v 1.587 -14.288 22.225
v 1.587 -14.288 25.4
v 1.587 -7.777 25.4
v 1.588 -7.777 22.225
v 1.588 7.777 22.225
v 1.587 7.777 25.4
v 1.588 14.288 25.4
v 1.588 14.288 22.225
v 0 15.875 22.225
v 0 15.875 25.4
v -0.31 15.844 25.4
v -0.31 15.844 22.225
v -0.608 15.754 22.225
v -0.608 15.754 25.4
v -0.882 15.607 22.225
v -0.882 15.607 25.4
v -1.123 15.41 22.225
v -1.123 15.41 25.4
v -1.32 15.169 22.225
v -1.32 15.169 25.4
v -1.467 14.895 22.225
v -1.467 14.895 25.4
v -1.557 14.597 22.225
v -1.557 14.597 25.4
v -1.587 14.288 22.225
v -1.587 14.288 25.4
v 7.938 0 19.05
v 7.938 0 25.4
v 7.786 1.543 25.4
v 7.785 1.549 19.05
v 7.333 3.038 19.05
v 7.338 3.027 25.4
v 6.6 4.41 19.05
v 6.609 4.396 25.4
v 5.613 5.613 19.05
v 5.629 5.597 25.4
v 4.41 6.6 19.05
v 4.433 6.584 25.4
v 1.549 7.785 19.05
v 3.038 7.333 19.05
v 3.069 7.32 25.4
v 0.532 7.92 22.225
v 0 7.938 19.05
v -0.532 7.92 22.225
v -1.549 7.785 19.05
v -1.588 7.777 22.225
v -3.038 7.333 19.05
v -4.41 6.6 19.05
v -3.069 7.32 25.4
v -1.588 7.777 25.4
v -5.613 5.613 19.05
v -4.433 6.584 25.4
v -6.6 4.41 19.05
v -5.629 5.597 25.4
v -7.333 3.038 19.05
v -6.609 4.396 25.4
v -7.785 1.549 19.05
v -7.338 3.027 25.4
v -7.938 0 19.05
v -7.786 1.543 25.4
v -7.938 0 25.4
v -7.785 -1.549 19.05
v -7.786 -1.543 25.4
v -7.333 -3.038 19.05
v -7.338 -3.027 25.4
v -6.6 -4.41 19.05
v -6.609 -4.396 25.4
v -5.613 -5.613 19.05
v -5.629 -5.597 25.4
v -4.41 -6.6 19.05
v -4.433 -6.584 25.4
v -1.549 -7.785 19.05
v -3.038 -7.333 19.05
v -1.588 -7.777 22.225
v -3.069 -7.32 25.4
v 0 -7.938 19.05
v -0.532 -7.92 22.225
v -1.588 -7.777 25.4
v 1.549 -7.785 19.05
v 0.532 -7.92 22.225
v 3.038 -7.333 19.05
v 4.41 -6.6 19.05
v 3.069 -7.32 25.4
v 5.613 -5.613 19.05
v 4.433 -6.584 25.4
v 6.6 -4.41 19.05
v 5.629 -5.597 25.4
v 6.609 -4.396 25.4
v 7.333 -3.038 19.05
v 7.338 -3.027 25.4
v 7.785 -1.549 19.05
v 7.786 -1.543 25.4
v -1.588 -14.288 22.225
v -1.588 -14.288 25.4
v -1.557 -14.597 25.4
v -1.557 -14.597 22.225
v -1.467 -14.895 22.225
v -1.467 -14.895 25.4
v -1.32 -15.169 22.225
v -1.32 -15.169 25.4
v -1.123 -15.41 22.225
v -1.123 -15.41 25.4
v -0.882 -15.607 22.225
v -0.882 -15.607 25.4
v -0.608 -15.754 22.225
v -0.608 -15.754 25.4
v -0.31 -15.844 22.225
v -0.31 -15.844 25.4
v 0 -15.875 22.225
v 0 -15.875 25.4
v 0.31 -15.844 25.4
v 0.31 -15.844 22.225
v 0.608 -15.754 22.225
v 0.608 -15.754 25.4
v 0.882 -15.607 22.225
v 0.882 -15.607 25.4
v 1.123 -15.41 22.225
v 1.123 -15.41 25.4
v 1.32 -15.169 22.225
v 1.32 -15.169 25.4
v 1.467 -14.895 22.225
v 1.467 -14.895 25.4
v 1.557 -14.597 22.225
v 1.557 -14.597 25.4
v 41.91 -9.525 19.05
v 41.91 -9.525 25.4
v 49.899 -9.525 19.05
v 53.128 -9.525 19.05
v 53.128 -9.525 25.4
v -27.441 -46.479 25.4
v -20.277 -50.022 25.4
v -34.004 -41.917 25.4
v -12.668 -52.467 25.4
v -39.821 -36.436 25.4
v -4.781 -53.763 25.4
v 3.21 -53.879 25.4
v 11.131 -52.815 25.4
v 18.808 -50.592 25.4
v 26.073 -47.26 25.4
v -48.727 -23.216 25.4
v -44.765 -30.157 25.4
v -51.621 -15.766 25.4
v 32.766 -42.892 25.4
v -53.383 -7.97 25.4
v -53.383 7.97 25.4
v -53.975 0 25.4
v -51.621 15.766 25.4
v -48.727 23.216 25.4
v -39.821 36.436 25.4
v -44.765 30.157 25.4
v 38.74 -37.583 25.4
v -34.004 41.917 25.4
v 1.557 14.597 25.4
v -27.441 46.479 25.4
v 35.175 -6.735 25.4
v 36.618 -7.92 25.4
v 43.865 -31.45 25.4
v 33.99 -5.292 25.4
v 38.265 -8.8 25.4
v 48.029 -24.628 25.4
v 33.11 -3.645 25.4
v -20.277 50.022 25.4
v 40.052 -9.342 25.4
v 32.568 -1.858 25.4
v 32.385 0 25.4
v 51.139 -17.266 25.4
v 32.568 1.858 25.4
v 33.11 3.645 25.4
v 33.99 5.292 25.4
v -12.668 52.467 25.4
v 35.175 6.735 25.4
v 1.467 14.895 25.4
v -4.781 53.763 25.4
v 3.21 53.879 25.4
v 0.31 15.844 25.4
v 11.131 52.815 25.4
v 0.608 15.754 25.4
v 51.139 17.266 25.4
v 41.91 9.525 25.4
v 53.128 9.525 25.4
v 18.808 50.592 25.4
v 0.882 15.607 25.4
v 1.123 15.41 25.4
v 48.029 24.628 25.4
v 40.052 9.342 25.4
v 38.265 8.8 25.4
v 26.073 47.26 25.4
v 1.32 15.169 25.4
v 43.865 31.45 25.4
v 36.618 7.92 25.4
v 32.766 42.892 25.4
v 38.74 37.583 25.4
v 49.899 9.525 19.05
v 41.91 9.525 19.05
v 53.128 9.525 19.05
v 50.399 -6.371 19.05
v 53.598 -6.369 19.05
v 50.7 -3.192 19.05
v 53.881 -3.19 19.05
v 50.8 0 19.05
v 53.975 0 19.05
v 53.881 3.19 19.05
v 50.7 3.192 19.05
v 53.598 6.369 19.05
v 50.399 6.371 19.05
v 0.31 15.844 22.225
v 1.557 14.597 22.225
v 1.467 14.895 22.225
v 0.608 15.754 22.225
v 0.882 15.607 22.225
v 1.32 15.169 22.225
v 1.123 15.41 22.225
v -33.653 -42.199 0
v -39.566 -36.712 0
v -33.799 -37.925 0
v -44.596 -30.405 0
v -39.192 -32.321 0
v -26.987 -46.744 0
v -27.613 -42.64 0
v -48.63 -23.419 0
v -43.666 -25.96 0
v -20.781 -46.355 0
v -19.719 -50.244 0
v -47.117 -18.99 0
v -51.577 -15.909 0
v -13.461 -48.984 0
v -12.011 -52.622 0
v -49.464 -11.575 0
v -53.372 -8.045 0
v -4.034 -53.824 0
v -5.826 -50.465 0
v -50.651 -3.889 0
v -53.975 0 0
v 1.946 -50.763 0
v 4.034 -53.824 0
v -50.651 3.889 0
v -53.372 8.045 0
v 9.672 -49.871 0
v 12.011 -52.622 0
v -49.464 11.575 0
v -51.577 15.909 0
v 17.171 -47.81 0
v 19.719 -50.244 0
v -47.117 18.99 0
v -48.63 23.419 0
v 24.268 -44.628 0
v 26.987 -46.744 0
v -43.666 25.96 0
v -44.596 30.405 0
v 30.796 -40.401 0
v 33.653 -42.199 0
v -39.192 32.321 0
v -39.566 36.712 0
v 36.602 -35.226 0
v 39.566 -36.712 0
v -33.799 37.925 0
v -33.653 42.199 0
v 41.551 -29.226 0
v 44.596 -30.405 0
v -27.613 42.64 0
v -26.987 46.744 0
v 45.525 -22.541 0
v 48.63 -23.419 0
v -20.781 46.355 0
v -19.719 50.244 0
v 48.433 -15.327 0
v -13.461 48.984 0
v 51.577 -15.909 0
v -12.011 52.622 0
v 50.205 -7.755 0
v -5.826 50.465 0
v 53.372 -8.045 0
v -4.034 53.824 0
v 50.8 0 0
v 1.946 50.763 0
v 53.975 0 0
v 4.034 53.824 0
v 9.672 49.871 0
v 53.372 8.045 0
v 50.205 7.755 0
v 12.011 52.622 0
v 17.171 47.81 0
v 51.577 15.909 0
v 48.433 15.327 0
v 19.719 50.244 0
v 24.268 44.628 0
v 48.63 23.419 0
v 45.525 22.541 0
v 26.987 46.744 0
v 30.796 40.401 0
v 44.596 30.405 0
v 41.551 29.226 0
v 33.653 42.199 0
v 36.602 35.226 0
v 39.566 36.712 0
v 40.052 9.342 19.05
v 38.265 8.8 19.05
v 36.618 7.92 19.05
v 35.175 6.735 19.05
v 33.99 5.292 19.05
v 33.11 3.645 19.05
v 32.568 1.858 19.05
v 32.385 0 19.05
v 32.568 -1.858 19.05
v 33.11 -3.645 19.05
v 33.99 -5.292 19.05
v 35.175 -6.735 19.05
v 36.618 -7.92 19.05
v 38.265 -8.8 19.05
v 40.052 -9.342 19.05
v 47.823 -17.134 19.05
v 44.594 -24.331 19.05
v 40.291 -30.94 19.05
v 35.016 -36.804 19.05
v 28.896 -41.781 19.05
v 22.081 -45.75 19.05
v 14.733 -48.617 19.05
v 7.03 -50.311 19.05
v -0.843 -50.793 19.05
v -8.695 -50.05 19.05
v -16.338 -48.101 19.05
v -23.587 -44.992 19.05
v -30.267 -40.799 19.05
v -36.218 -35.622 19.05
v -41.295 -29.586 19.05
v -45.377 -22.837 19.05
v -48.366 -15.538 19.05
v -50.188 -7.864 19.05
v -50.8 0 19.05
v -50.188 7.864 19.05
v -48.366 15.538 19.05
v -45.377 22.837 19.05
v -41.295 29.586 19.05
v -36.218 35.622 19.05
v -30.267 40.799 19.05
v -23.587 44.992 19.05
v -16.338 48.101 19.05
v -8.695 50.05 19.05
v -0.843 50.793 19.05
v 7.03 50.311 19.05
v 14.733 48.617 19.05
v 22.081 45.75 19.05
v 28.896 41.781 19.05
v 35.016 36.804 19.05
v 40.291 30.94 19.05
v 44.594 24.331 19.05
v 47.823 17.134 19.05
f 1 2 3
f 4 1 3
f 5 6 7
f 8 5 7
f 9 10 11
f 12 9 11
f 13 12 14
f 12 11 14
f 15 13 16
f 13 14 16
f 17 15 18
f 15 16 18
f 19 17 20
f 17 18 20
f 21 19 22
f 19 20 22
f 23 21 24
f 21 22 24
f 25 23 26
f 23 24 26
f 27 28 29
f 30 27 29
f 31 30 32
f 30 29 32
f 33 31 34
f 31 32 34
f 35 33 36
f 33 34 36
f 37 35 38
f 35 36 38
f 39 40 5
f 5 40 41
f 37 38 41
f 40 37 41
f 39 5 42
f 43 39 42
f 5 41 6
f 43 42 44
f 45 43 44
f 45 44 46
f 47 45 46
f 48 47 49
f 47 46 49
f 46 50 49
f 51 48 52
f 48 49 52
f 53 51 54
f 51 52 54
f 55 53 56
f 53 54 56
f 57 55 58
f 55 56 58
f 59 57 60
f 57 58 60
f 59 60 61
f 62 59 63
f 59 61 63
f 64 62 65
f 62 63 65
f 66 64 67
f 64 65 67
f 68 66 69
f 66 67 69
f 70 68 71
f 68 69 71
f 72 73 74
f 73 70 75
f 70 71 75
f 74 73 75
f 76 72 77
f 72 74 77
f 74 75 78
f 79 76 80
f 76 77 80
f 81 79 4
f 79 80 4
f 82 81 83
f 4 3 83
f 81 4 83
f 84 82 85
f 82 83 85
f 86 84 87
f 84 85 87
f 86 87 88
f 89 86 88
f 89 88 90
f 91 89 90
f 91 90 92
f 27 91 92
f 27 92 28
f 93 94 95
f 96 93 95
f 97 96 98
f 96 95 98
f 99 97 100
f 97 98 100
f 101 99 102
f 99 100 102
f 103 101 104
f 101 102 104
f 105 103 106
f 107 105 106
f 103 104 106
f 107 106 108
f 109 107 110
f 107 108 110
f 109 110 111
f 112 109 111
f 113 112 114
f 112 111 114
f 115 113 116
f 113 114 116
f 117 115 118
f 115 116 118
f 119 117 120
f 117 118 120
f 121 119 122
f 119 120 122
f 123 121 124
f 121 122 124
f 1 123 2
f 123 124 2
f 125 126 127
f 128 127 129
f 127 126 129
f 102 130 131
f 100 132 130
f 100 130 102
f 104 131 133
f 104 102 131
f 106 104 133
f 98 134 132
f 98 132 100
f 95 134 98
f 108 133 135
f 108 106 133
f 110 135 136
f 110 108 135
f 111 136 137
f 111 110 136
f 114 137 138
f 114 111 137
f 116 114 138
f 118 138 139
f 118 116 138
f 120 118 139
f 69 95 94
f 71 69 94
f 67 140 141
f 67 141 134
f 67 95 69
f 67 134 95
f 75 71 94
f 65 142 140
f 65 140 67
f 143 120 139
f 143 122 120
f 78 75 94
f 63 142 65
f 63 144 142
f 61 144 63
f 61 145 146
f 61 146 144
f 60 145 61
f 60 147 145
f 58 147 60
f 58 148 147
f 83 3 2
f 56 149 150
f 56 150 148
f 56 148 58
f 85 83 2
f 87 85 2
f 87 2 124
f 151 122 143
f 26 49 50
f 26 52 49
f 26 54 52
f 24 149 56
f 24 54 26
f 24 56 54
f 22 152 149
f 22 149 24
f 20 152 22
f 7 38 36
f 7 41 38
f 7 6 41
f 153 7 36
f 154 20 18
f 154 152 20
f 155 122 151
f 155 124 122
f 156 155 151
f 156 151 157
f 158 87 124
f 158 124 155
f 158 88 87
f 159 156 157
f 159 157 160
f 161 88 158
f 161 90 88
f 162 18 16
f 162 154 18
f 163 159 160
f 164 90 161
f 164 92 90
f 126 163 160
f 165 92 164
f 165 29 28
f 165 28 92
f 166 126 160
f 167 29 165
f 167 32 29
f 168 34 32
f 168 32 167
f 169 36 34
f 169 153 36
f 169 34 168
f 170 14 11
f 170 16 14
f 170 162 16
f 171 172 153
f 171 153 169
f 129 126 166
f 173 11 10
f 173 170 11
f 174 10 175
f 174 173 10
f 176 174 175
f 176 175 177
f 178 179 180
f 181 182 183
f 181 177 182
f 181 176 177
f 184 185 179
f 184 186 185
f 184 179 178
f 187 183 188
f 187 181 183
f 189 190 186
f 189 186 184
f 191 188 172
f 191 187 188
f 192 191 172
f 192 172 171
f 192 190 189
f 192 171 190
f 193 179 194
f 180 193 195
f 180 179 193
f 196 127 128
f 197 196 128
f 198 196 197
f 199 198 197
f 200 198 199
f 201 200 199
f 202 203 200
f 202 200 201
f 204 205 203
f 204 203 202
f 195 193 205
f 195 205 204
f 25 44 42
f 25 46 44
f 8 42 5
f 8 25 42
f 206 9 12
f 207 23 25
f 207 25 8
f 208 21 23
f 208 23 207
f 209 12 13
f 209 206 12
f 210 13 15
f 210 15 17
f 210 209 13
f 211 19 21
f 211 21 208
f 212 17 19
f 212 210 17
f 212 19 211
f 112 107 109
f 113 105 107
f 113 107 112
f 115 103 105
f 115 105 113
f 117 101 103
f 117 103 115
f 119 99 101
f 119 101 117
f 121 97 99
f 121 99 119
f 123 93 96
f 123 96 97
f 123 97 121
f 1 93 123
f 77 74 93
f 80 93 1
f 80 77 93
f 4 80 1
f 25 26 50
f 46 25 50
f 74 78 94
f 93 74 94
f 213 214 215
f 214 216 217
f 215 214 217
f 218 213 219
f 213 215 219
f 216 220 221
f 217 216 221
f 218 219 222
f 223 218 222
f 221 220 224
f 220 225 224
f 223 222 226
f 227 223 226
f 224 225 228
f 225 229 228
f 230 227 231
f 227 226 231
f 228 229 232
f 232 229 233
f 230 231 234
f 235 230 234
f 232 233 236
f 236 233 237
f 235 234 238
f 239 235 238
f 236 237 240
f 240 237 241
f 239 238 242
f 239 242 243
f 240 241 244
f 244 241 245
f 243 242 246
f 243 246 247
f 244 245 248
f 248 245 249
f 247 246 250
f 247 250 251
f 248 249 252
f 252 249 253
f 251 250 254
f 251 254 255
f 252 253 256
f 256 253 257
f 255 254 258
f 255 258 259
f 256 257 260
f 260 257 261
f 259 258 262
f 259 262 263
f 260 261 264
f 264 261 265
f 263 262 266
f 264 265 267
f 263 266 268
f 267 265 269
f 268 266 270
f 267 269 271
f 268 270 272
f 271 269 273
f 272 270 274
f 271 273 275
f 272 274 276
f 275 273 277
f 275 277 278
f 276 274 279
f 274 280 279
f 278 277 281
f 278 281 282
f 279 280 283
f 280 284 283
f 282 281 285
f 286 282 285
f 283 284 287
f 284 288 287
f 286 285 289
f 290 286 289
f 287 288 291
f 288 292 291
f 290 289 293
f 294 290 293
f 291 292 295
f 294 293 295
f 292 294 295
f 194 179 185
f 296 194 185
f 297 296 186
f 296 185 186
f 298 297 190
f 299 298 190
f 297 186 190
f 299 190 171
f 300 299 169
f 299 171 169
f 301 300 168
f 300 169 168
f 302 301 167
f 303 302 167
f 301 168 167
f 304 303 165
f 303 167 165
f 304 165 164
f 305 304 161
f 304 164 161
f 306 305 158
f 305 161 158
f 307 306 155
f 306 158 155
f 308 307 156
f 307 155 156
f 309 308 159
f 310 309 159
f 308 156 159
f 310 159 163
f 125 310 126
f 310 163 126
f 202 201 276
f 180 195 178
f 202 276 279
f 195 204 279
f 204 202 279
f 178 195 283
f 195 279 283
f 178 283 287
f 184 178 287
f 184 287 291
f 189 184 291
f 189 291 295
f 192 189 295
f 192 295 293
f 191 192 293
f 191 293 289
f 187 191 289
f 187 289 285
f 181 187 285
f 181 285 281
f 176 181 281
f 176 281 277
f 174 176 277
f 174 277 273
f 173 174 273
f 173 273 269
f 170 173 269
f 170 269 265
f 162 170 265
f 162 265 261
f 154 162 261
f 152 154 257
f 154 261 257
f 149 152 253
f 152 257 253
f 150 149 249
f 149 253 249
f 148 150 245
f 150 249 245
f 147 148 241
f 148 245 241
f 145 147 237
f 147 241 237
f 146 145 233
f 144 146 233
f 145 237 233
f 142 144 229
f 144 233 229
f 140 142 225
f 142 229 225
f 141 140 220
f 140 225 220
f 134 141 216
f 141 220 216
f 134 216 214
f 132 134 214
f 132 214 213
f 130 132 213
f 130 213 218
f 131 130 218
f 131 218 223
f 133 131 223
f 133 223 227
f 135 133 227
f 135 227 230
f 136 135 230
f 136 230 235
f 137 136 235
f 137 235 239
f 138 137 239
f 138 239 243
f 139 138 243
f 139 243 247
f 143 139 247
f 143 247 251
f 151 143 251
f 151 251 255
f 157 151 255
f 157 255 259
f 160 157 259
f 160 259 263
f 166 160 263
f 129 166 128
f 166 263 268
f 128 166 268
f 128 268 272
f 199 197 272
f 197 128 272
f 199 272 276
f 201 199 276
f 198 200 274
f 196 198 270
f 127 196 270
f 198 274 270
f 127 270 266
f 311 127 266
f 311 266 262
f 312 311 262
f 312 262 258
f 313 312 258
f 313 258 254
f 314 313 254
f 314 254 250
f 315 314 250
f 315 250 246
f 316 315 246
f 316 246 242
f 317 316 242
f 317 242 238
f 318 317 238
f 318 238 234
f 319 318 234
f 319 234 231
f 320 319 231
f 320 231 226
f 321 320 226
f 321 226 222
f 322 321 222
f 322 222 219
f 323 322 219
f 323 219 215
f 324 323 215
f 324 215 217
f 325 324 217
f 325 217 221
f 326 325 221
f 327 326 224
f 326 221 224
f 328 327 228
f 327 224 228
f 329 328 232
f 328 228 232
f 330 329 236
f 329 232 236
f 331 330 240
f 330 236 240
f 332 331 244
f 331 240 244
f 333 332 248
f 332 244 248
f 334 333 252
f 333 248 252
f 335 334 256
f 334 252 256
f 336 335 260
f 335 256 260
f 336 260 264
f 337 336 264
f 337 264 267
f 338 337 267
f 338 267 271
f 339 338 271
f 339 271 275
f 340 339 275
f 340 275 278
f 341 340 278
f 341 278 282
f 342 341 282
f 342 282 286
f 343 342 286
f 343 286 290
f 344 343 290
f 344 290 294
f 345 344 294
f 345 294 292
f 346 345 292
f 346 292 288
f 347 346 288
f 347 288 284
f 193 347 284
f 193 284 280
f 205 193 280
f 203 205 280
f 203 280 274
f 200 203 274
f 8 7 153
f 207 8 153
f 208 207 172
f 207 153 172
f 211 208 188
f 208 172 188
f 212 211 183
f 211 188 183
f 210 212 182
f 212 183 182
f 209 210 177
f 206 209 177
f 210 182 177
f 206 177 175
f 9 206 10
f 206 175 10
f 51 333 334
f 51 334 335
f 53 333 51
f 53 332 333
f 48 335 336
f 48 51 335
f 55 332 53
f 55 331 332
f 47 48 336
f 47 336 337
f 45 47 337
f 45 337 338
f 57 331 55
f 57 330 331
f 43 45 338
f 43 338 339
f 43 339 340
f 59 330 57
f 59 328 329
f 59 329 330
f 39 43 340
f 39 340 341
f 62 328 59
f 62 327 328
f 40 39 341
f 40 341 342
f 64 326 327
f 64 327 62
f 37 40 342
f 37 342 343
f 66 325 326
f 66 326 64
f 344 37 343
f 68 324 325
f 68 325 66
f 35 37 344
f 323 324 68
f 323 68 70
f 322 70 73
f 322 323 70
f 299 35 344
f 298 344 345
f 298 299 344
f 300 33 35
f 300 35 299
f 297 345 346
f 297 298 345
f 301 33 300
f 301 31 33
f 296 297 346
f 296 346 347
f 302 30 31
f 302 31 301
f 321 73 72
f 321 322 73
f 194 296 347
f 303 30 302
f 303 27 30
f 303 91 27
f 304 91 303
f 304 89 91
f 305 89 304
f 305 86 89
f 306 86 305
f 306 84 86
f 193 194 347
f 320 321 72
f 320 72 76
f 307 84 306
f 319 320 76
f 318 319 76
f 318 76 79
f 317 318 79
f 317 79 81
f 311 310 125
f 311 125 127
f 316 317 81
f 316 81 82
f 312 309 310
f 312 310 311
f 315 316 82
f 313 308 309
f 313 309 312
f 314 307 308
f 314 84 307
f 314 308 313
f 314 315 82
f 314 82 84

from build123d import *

# Parameters (mm, degrees)
F0_R      = 53.975
F1_DEPTH  = 25.4
F2_R      = 50.8
F3_DEPTH  = 19.05
F4_R      = 9.525
F5_DEPTH  = 6.35
F6_W      = 17.119241
F6_H      = 19.05
F7_DEPTH  = 6.35
F8_R      = 7.9375
F9_DEPTH  = 6.35
F11_DEPTH = 3.175


with BuildPart() as f1:
    # F0 (on Top) → F1 (new body)
    with BuildSketch(Plane.XY):
        Circle(F0_R)
    extrude(amount=F1_DEPTH)

    # F2 (on face) → F3 (cut)
    with BuildSketch(Plane(origin=(0, 0, 0), x_dir=(1, 0, 0), z_dir=(0, 0, -1))):
        Circle(F2_R)
    extrude(amount=-F3_DEPTH, mode=Mode.SUBTRACT)

    # F4 (on face) → F5 (cut, through all)
    with BuildSketch(Plane.XY.offset(25.4)):
        with Locations((41.91, 0)):
            Circle(F4_R)
    extrude(amount=-F5_DEPTH, mode=Mode.SUBTRACT)

    # F6 (on face) → F7 (cut, through all)
    with BuildSketch(Plane.XY.offset(25.4)):
        with Locations((50.46962, 0)):
            Rectangle(F6_W, F6_H)
    extrude(amount=-F7_DEPTH, mode=Mode.SUBTRACT)

    # F8 (on face) → F9 (cut, through all)
    with BuildSketch(Plane.XY.offset(25.4)):
        Circle(F8_R)
    extrude(amount=-F9_DEPTH, mode=Mode.SUBTRACT)

    # F10 (on face) → F11 (cut)
    with BuildSketch(Plane.XY.offset(25.4)):
        with BuildLine():
            ThreePointArc((0, -15.875), (1.122532, -15.410032), (1.5875, -14.2875))
            Line((1.5875, -14.2875), (1.5875, 14.2875))
            ThreePointArc((1.5875, 14.2875), (1.122532, 15.410032), (0, 15.875))
            ThreePointArc((0, 15.875), (-1.122532, 15.410032), (-1.5875, 14.2875))
            Line((-1.5875, 14.2875), (-1.5875, -14.2875))
            ThreePointArc((-1.5875, -14.2875), (-1.122532, -15.410032), (0, -15.875))
        make_face()
    extrude(amount=-F11_DEPTH, mode=Mode.SUBTRACT)


solid = f1.part
